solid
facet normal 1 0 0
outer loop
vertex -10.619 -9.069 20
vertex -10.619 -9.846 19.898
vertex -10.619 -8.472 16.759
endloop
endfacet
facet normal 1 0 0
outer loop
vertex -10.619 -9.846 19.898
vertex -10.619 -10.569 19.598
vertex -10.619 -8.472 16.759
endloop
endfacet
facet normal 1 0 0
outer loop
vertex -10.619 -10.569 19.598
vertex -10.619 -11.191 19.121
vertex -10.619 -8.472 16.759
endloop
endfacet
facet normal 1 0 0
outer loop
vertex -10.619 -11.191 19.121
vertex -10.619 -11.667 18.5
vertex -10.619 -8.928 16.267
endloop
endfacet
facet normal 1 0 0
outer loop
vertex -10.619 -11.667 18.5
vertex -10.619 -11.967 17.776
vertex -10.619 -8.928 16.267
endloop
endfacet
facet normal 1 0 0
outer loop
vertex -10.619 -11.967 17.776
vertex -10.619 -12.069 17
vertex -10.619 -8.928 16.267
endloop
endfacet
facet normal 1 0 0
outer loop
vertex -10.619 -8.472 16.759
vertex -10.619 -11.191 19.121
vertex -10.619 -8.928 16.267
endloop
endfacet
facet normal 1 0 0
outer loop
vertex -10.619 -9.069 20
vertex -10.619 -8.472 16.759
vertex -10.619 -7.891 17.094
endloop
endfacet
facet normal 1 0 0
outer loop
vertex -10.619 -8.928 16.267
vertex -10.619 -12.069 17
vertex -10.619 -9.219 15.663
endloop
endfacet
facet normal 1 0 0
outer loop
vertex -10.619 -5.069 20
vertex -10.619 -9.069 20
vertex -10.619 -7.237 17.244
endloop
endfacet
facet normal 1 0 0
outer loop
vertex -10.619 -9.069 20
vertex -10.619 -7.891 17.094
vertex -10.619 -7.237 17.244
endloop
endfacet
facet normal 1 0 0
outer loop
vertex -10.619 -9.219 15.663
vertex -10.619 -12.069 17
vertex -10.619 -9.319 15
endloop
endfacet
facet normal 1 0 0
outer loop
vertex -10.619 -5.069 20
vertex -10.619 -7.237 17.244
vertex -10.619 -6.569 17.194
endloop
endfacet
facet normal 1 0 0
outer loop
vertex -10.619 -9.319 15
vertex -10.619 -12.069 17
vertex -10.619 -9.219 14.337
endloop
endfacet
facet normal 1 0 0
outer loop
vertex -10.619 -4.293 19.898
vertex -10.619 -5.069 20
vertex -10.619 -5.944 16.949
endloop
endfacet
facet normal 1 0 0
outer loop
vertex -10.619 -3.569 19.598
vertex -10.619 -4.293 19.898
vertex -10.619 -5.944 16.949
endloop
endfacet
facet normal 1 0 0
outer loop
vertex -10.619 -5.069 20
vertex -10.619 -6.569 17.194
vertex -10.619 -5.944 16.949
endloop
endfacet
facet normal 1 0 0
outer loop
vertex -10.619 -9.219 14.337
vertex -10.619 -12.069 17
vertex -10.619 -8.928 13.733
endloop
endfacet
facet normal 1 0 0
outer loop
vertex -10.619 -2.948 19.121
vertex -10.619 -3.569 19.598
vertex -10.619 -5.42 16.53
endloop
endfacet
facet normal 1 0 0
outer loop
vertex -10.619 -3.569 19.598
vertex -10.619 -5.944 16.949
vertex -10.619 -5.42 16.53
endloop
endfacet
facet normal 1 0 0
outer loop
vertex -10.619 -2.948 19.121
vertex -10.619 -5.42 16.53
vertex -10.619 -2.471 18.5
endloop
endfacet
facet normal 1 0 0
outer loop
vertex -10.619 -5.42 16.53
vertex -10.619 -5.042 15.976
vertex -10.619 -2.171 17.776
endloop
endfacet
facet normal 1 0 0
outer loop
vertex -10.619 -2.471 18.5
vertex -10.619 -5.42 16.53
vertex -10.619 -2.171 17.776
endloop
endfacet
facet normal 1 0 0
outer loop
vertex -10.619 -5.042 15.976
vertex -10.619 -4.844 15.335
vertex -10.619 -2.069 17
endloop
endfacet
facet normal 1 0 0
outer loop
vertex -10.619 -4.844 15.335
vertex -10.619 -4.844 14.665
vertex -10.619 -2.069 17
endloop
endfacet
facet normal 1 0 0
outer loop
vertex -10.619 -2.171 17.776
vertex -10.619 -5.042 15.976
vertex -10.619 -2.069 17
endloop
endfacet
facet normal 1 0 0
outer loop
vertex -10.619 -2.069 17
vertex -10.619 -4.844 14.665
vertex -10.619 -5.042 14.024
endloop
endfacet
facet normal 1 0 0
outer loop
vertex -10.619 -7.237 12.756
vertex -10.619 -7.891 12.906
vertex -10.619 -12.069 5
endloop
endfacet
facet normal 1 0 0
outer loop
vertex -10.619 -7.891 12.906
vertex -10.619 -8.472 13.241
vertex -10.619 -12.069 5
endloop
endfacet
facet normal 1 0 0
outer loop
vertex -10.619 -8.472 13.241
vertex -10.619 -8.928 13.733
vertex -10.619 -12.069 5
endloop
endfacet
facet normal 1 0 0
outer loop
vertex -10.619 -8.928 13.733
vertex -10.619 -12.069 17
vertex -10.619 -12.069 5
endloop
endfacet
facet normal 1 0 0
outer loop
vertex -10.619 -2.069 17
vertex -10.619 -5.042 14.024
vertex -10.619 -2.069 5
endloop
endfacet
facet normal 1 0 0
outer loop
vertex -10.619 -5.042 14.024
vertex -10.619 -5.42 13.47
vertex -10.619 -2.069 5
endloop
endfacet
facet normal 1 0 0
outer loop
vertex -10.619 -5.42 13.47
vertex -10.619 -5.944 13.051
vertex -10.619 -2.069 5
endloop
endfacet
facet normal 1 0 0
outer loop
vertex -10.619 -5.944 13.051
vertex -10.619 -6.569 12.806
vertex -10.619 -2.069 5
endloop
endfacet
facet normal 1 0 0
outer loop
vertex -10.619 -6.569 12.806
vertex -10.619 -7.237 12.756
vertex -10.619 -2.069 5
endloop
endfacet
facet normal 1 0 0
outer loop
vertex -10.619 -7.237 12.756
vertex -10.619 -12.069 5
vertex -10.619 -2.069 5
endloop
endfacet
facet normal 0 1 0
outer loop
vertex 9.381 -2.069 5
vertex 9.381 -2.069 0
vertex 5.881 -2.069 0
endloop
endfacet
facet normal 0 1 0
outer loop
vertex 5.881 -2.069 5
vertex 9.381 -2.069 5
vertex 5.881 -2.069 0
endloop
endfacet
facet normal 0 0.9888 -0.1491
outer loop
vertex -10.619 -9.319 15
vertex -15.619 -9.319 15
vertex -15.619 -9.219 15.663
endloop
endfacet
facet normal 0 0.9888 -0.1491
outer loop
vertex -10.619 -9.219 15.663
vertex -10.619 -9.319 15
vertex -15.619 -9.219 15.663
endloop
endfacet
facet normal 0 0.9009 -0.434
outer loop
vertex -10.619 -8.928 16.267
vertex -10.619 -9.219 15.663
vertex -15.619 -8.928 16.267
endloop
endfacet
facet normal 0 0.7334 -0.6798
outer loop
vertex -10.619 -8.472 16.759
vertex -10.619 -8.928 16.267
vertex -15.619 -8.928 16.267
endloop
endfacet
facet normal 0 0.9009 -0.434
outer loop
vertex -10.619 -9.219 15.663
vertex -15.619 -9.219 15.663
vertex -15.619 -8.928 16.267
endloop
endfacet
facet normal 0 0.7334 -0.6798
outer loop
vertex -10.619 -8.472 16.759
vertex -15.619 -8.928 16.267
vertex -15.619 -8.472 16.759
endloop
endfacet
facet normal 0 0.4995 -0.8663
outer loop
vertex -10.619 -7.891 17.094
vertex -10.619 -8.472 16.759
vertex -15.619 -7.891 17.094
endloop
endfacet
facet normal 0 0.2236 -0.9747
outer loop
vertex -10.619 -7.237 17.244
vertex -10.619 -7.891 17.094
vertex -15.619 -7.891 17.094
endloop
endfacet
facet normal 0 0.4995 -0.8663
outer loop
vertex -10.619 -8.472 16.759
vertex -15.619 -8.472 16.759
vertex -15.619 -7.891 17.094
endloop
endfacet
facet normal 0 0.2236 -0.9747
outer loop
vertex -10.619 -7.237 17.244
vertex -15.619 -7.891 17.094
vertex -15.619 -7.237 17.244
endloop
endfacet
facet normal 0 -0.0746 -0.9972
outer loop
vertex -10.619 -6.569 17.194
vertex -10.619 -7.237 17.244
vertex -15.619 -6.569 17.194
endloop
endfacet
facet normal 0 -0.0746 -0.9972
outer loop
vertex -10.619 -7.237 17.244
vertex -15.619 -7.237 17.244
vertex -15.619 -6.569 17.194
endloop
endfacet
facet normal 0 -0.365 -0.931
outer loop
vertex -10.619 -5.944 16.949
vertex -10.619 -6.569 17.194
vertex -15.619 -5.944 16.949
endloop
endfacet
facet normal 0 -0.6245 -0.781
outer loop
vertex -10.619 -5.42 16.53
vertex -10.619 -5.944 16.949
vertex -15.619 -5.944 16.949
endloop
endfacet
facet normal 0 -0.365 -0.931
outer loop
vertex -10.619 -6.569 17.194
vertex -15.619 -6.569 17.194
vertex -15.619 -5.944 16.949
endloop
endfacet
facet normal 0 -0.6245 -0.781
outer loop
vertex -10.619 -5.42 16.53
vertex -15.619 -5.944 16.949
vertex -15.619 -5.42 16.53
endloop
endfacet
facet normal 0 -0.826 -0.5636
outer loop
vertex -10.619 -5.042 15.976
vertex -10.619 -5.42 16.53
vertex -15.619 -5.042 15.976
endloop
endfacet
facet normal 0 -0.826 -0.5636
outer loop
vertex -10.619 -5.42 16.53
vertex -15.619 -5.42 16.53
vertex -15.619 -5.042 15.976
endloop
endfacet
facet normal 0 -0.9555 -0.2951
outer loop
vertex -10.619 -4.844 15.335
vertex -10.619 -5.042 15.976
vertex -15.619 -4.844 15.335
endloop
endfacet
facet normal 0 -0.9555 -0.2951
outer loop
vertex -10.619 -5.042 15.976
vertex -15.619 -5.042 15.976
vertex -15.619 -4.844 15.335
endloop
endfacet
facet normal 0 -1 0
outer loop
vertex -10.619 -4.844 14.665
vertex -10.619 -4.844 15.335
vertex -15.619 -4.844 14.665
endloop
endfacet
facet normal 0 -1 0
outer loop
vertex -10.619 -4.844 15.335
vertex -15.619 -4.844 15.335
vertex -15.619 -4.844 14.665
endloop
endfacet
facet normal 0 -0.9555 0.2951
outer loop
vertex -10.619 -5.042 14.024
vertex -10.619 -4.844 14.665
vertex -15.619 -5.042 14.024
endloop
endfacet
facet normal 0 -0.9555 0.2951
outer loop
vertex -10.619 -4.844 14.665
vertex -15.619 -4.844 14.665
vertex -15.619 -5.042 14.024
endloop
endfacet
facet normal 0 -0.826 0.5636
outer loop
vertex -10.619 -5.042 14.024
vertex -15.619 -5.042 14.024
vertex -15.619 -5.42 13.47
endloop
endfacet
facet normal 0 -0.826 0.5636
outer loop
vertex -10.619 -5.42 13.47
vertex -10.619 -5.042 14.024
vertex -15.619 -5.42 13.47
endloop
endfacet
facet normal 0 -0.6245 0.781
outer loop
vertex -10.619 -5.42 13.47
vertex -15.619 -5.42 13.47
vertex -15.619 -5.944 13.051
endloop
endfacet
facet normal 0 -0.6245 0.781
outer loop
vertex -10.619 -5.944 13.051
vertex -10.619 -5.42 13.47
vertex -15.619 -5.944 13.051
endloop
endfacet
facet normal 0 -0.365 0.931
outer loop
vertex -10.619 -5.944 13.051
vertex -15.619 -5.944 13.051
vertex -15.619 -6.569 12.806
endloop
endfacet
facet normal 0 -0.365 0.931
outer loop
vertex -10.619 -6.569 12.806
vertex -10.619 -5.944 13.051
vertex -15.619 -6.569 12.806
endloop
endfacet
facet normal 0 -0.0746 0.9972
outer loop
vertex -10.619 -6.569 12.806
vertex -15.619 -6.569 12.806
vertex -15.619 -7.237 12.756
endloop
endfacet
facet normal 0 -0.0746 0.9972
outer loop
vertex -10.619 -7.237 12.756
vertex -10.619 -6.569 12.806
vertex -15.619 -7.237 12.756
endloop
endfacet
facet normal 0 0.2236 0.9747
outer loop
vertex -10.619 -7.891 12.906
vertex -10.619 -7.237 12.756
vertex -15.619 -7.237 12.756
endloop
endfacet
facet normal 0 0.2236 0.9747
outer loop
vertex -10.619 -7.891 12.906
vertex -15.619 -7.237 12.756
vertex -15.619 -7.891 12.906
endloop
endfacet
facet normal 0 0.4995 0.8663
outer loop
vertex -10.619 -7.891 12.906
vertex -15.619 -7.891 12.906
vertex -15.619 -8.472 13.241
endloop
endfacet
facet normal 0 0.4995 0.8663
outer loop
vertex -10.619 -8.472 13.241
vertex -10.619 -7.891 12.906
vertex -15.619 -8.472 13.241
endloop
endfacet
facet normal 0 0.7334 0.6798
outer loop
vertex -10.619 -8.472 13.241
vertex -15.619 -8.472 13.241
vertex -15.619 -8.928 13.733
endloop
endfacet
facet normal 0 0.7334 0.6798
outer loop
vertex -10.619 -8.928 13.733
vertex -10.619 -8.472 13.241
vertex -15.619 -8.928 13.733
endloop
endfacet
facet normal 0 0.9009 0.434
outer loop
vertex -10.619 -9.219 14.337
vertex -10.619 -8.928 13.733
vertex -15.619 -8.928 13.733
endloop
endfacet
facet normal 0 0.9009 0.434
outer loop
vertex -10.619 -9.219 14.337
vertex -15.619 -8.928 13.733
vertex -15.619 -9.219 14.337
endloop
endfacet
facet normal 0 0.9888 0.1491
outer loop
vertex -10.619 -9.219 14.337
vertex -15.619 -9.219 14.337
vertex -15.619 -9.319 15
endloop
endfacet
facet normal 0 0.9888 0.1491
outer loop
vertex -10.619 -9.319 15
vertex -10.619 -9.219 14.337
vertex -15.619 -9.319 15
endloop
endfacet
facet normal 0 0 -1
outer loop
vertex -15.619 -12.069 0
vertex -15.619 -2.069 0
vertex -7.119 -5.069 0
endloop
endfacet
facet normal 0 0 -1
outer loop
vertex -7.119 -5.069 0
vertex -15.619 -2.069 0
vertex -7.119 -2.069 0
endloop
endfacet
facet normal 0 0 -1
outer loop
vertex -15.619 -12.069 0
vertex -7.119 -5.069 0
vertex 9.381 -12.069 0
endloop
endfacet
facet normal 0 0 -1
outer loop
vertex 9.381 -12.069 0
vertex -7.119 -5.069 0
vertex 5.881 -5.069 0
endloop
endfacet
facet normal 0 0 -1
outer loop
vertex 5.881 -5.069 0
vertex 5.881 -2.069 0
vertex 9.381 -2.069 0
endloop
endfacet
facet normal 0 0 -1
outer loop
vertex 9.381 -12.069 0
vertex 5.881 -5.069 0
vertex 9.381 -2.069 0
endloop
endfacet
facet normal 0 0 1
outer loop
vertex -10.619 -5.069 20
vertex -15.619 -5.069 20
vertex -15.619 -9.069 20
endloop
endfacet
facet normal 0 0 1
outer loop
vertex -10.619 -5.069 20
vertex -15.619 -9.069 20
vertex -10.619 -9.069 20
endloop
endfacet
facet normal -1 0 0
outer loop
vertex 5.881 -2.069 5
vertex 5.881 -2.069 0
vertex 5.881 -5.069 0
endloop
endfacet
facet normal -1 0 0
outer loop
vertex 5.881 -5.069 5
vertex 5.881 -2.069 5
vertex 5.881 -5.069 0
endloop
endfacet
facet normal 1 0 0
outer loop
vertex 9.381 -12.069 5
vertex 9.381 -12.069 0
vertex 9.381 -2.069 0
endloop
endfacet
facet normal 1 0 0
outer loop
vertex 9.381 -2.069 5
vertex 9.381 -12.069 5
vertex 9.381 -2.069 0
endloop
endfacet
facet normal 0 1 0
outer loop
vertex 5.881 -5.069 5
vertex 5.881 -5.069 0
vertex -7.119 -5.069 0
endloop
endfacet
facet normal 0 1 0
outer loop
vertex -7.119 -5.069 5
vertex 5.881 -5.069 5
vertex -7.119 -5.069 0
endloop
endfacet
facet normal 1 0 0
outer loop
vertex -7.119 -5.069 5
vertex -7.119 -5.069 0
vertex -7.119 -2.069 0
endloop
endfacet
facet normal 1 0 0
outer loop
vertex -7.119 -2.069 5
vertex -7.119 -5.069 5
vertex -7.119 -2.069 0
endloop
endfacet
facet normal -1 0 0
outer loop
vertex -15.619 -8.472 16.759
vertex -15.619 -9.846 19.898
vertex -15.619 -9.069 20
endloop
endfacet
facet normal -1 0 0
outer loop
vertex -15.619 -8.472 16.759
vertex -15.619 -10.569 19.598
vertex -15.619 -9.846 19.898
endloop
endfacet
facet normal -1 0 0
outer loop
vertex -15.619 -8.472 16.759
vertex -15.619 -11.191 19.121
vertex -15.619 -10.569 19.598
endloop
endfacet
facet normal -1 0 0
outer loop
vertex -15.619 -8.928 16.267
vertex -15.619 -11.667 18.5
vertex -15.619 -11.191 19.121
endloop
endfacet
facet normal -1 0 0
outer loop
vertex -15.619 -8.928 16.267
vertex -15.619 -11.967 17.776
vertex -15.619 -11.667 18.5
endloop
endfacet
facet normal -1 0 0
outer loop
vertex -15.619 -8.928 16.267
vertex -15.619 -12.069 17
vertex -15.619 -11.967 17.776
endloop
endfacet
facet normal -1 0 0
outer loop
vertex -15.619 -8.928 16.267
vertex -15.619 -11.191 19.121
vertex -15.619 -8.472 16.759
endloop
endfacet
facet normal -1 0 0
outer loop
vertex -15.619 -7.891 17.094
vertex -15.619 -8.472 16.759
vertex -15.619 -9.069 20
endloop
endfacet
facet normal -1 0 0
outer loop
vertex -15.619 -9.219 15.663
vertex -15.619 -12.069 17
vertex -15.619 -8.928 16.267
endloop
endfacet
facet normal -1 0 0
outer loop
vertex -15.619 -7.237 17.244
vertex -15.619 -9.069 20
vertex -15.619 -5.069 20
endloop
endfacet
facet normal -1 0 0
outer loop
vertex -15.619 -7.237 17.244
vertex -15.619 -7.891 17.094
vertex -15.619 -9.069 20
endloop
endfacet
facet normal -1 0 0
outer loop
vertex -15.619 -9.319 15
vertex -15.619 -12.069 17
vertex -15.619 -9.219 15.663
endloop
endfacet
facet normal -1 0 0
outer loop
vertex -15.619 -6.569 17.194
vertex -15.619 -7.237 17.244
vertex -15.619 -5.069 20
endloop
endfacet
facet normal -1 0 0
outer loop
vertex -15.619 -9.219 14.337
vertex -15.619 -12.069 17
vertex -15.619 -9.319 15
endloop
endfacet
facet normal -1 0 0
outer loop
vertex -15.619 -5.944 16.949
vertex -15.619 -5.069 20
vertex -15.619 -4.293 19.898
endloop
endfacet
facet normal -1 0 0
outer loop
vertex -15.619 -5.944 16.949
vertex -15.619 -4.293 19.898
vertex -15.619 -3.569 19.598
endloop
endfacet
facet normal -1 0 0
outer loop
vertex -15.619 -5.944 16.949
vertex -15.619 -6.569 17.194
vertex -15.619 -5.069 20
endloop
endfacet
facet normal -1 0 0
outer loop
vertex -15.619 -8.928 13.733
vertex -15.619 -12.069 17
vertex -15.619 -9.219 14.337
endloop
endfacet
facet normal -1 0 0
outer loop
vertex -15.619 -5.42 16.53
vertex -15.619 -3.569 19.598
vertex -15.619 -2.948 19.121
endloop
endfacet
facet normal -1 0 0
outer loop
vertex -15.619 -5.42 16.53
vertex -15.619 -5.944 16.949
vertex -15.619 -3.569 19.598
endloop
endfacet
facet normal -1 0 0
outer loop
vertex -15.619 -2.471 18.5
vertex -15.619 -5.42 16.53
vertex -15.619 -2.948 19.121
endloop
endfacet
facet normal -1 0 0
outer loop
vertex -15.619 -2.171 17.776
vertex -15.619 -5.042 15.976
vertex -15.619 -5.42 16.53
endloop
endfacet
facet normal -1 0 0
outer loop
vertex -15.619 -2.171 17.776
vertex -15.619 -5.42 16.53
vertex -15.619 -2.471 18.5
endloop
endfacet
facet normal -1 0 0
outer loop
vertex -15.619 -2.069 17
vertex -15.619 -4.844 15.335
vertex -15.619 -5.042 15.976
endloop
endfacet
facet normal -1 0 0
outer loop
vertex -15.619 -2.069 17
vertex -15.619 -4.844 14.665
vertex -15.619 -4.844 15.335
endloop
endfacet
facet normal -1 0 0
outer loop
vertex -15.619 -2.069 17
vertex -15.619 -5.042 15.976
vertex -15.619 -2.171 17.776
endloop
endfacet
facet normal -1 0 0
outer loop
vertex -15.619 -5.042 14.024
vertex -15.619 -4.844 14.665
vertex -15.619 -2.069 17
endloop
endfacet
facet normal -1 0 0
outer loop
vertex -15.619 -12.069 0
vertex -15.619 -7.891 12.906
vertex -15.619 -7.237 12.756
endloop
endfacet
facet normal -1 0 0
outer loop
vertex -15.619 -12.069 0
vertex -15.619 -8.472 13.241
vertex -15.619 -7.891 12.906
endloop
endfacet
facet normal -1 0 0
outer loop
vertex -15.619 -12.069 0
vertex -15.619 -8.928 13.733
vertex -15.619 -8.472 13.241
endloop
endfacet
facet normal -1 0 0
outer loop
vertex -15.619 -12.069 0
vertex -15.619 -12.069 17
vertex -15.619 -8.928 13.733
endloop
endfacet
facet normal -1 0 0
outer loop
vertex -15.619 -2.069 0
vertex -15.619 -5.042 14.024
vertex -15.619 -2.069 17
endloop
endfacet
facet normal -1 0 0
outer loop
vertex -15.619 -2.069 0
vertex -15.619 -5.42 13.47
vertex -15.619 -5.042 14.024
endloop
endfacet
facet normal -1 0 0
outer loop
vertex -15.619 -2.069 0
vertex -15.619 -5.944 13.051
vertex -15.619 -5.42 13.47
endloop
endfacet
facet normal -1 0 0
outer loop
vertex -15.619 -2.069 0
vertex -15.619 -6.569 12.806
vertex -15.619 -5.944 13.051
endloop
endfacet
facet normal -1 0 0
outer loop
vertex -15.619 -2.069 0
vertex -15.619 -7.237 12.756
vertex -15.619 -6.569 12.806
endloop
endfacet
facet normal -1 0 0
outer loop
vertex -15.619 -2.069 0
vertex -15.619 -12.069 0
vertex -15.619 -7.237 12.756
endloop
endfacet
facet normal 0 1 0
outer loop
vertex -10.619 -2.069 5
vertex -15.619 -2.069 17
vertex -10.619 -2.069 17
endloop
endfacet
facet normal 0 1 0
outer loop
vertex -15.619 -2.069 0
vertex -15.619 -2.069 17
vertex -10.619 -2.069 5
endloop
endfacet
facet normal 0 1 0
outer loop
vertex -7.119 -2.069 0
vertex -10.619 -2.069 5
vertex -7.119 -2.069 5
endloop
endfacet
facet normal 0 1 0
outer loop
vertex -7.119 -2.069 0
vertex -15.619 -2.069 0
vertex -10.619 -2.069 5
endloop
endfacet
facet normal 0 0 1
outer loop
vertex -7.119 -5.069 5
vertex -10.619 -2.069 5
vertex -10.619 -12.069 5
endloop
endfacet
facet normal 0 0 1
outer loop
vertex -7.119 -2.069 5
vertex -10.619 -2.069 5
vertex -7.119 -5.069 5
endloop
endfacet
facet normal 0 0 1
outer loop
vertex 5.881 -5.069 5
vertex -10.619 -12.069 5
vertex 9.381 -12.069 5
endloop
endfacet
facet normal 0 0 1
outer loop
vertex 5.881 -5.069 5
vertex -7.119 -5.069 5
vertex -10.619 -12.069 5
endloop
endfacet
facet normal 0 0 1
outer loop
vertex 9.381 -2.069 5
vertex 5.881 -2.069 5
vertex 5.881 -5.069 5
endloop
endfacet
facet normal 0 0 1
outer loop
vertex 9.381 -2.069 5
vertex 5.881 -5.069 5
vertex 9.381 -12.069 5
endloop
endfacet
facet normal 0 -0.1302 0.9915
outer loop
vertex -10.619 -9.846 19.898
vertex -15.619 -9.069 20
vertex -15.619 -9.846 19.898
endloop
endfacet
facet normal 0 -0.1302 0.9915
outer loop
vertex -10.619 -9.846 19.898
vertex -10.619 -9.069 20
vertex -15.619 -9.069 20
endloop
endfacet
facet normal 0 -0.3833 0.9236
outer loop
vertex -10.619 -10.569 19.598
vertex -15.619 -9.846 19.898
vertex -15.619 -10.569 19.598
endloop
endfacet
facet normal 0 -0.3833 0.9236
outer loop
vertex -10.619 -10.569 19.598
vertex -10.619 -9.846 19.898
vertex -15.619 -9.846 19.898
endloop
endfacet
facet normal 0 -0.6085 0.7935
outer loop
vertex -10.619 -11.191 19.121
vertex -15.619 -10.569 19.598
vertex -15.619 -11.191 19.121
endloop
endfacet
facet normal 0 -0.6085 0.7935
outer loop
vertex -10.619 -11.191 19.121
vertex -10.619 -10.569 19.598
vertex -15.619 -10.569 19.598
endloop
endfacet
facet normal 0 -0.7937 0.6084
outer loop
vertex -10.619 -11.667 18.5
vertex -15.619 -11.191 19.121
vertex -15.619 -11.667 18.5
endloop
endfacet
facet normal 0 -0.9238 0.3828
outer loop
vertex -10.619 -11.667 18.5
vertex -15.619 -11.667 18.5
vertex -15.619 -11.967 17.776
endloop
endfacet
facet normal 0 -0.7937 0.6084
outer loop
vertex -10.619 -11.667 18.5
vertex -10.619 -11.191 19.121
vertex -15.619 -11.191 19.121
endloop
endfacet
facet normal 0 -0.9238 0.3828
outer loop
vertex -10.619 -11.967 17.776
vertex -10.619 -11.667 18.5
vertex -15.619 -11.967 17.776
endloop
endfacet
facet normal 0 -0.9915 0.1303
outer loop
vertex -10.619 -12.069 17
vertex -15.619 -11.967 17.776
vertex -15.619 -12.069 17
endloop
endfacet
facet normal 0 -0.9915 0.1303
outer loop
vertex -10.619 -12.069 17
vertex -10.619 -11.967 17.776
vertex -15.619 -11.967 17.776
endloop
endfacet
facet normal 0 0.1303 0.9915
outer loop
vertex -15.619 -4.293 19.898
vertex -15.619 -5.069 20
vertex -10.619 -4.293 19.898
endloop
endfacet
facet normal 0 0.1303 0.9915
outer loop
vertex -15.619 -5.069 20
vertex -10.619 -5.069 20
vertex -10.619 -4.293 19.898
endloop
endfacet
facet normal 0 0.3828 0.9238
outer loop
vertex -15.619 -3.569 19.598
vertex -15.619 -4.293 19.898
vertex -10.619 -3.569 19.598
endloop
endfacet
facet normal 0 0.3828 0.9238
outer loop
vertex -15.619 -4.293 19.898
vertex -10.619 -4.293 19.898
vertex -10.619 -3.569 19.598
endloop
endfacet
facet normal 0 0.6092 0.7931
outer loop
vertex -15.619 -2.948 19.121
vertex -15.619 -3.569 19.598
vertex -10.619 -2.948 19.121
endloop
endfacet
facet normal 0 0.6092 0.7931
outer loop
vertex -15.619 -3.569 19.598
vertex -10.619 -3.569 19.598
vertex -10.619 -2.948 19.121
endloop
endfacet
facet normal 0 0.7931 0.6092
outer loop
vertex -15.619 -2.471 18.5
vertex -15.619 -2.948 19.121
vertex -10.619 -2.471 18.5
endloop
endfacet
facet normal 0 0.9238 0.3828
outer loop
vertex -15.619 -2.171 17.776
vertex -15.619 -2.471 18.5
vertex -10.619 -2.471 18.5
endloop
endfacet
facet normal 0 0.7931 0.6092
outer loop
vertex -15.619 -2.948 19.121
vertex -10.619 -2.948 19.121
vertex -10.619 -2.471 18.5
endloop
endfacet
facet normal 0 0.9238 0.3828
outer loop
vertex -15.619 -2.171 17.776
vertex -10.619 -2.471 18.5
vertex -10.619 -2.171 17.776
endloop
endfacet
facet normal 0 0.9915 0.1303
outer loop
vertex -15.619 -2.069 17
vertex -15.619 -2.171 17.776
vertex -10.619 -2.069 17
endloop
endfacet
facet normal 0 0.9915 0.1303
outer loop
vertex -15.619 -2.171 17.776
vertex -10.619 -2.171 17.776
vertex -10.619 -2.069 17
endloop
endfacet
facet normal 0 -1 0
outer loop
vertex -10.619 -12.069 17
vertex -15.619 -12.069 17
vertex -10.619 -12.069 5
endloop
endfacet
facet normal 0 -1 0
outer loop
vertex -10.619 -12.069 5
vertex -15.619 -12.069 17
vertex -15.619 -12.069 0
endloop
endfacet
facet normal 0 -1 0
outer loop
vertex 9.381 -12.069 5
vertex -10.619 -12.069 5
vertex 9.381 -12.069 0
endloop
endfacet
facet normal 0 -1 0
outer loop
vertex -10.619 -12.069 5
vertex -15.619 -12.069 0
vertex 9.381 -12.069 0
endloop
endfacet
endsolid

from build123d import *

# Parameters (mm, degrees)
F1_DEPTH = 5
F2_W     = 5
F2_H     = 10
F3_DEPTH = 15
F4_R     = 2.25
F5_DEPTH = 25
F6_R     = 3


with BuildPart() as f1:
    # F0 (on Top) → F1 (new body)
    with BuildSketch(Plane.XY):
        Polygon((-15.6191263039, -2.0692273974), (-15.6191263039, -12.0692273974), (9.3808736961, -12.0692273974), (9.3808736961, -2.0692273974), (5.8808736961, -2.0692273974), (5.8808736961, -5.0692273974), (-7.1191263039, -5.0692273974), (-7.1191263039, -2.0692273974), align=None)
    extrude(amount=F1_DEPTH)

    # F2 (on face) → F3 (join)
    with BuildSketch(Plane.XY.offset(5)):
        with Locations((-13.1191263039, -7.0692273974)):
            Rectangle(F2_W, F2_H)
    extrude(amount=F3_DEPTH)

    # F4 (on face) → F5 (cut)
    with BuildSketch(Plane(origin=(-15.6191263039, 0, 0), x_dir=(0, -1, 0), z_dir=(-1, 0, 0))):
        with Locations((7.0692273974, 15)):
            Circle(F4_R)
    extrude(amount=-F5_DEPTH, mode=Mode.SUBTRACT)

    # F6
    f6_edges = [f1.edges().sort_by_distance(p)[0] for p in [
        (-13.119126, -12.069227, 20),
        (-13.119126, -2.069227, 20),
    ]]
    fillet(f6_edges, radius=F6_R)


solid = f1.part
